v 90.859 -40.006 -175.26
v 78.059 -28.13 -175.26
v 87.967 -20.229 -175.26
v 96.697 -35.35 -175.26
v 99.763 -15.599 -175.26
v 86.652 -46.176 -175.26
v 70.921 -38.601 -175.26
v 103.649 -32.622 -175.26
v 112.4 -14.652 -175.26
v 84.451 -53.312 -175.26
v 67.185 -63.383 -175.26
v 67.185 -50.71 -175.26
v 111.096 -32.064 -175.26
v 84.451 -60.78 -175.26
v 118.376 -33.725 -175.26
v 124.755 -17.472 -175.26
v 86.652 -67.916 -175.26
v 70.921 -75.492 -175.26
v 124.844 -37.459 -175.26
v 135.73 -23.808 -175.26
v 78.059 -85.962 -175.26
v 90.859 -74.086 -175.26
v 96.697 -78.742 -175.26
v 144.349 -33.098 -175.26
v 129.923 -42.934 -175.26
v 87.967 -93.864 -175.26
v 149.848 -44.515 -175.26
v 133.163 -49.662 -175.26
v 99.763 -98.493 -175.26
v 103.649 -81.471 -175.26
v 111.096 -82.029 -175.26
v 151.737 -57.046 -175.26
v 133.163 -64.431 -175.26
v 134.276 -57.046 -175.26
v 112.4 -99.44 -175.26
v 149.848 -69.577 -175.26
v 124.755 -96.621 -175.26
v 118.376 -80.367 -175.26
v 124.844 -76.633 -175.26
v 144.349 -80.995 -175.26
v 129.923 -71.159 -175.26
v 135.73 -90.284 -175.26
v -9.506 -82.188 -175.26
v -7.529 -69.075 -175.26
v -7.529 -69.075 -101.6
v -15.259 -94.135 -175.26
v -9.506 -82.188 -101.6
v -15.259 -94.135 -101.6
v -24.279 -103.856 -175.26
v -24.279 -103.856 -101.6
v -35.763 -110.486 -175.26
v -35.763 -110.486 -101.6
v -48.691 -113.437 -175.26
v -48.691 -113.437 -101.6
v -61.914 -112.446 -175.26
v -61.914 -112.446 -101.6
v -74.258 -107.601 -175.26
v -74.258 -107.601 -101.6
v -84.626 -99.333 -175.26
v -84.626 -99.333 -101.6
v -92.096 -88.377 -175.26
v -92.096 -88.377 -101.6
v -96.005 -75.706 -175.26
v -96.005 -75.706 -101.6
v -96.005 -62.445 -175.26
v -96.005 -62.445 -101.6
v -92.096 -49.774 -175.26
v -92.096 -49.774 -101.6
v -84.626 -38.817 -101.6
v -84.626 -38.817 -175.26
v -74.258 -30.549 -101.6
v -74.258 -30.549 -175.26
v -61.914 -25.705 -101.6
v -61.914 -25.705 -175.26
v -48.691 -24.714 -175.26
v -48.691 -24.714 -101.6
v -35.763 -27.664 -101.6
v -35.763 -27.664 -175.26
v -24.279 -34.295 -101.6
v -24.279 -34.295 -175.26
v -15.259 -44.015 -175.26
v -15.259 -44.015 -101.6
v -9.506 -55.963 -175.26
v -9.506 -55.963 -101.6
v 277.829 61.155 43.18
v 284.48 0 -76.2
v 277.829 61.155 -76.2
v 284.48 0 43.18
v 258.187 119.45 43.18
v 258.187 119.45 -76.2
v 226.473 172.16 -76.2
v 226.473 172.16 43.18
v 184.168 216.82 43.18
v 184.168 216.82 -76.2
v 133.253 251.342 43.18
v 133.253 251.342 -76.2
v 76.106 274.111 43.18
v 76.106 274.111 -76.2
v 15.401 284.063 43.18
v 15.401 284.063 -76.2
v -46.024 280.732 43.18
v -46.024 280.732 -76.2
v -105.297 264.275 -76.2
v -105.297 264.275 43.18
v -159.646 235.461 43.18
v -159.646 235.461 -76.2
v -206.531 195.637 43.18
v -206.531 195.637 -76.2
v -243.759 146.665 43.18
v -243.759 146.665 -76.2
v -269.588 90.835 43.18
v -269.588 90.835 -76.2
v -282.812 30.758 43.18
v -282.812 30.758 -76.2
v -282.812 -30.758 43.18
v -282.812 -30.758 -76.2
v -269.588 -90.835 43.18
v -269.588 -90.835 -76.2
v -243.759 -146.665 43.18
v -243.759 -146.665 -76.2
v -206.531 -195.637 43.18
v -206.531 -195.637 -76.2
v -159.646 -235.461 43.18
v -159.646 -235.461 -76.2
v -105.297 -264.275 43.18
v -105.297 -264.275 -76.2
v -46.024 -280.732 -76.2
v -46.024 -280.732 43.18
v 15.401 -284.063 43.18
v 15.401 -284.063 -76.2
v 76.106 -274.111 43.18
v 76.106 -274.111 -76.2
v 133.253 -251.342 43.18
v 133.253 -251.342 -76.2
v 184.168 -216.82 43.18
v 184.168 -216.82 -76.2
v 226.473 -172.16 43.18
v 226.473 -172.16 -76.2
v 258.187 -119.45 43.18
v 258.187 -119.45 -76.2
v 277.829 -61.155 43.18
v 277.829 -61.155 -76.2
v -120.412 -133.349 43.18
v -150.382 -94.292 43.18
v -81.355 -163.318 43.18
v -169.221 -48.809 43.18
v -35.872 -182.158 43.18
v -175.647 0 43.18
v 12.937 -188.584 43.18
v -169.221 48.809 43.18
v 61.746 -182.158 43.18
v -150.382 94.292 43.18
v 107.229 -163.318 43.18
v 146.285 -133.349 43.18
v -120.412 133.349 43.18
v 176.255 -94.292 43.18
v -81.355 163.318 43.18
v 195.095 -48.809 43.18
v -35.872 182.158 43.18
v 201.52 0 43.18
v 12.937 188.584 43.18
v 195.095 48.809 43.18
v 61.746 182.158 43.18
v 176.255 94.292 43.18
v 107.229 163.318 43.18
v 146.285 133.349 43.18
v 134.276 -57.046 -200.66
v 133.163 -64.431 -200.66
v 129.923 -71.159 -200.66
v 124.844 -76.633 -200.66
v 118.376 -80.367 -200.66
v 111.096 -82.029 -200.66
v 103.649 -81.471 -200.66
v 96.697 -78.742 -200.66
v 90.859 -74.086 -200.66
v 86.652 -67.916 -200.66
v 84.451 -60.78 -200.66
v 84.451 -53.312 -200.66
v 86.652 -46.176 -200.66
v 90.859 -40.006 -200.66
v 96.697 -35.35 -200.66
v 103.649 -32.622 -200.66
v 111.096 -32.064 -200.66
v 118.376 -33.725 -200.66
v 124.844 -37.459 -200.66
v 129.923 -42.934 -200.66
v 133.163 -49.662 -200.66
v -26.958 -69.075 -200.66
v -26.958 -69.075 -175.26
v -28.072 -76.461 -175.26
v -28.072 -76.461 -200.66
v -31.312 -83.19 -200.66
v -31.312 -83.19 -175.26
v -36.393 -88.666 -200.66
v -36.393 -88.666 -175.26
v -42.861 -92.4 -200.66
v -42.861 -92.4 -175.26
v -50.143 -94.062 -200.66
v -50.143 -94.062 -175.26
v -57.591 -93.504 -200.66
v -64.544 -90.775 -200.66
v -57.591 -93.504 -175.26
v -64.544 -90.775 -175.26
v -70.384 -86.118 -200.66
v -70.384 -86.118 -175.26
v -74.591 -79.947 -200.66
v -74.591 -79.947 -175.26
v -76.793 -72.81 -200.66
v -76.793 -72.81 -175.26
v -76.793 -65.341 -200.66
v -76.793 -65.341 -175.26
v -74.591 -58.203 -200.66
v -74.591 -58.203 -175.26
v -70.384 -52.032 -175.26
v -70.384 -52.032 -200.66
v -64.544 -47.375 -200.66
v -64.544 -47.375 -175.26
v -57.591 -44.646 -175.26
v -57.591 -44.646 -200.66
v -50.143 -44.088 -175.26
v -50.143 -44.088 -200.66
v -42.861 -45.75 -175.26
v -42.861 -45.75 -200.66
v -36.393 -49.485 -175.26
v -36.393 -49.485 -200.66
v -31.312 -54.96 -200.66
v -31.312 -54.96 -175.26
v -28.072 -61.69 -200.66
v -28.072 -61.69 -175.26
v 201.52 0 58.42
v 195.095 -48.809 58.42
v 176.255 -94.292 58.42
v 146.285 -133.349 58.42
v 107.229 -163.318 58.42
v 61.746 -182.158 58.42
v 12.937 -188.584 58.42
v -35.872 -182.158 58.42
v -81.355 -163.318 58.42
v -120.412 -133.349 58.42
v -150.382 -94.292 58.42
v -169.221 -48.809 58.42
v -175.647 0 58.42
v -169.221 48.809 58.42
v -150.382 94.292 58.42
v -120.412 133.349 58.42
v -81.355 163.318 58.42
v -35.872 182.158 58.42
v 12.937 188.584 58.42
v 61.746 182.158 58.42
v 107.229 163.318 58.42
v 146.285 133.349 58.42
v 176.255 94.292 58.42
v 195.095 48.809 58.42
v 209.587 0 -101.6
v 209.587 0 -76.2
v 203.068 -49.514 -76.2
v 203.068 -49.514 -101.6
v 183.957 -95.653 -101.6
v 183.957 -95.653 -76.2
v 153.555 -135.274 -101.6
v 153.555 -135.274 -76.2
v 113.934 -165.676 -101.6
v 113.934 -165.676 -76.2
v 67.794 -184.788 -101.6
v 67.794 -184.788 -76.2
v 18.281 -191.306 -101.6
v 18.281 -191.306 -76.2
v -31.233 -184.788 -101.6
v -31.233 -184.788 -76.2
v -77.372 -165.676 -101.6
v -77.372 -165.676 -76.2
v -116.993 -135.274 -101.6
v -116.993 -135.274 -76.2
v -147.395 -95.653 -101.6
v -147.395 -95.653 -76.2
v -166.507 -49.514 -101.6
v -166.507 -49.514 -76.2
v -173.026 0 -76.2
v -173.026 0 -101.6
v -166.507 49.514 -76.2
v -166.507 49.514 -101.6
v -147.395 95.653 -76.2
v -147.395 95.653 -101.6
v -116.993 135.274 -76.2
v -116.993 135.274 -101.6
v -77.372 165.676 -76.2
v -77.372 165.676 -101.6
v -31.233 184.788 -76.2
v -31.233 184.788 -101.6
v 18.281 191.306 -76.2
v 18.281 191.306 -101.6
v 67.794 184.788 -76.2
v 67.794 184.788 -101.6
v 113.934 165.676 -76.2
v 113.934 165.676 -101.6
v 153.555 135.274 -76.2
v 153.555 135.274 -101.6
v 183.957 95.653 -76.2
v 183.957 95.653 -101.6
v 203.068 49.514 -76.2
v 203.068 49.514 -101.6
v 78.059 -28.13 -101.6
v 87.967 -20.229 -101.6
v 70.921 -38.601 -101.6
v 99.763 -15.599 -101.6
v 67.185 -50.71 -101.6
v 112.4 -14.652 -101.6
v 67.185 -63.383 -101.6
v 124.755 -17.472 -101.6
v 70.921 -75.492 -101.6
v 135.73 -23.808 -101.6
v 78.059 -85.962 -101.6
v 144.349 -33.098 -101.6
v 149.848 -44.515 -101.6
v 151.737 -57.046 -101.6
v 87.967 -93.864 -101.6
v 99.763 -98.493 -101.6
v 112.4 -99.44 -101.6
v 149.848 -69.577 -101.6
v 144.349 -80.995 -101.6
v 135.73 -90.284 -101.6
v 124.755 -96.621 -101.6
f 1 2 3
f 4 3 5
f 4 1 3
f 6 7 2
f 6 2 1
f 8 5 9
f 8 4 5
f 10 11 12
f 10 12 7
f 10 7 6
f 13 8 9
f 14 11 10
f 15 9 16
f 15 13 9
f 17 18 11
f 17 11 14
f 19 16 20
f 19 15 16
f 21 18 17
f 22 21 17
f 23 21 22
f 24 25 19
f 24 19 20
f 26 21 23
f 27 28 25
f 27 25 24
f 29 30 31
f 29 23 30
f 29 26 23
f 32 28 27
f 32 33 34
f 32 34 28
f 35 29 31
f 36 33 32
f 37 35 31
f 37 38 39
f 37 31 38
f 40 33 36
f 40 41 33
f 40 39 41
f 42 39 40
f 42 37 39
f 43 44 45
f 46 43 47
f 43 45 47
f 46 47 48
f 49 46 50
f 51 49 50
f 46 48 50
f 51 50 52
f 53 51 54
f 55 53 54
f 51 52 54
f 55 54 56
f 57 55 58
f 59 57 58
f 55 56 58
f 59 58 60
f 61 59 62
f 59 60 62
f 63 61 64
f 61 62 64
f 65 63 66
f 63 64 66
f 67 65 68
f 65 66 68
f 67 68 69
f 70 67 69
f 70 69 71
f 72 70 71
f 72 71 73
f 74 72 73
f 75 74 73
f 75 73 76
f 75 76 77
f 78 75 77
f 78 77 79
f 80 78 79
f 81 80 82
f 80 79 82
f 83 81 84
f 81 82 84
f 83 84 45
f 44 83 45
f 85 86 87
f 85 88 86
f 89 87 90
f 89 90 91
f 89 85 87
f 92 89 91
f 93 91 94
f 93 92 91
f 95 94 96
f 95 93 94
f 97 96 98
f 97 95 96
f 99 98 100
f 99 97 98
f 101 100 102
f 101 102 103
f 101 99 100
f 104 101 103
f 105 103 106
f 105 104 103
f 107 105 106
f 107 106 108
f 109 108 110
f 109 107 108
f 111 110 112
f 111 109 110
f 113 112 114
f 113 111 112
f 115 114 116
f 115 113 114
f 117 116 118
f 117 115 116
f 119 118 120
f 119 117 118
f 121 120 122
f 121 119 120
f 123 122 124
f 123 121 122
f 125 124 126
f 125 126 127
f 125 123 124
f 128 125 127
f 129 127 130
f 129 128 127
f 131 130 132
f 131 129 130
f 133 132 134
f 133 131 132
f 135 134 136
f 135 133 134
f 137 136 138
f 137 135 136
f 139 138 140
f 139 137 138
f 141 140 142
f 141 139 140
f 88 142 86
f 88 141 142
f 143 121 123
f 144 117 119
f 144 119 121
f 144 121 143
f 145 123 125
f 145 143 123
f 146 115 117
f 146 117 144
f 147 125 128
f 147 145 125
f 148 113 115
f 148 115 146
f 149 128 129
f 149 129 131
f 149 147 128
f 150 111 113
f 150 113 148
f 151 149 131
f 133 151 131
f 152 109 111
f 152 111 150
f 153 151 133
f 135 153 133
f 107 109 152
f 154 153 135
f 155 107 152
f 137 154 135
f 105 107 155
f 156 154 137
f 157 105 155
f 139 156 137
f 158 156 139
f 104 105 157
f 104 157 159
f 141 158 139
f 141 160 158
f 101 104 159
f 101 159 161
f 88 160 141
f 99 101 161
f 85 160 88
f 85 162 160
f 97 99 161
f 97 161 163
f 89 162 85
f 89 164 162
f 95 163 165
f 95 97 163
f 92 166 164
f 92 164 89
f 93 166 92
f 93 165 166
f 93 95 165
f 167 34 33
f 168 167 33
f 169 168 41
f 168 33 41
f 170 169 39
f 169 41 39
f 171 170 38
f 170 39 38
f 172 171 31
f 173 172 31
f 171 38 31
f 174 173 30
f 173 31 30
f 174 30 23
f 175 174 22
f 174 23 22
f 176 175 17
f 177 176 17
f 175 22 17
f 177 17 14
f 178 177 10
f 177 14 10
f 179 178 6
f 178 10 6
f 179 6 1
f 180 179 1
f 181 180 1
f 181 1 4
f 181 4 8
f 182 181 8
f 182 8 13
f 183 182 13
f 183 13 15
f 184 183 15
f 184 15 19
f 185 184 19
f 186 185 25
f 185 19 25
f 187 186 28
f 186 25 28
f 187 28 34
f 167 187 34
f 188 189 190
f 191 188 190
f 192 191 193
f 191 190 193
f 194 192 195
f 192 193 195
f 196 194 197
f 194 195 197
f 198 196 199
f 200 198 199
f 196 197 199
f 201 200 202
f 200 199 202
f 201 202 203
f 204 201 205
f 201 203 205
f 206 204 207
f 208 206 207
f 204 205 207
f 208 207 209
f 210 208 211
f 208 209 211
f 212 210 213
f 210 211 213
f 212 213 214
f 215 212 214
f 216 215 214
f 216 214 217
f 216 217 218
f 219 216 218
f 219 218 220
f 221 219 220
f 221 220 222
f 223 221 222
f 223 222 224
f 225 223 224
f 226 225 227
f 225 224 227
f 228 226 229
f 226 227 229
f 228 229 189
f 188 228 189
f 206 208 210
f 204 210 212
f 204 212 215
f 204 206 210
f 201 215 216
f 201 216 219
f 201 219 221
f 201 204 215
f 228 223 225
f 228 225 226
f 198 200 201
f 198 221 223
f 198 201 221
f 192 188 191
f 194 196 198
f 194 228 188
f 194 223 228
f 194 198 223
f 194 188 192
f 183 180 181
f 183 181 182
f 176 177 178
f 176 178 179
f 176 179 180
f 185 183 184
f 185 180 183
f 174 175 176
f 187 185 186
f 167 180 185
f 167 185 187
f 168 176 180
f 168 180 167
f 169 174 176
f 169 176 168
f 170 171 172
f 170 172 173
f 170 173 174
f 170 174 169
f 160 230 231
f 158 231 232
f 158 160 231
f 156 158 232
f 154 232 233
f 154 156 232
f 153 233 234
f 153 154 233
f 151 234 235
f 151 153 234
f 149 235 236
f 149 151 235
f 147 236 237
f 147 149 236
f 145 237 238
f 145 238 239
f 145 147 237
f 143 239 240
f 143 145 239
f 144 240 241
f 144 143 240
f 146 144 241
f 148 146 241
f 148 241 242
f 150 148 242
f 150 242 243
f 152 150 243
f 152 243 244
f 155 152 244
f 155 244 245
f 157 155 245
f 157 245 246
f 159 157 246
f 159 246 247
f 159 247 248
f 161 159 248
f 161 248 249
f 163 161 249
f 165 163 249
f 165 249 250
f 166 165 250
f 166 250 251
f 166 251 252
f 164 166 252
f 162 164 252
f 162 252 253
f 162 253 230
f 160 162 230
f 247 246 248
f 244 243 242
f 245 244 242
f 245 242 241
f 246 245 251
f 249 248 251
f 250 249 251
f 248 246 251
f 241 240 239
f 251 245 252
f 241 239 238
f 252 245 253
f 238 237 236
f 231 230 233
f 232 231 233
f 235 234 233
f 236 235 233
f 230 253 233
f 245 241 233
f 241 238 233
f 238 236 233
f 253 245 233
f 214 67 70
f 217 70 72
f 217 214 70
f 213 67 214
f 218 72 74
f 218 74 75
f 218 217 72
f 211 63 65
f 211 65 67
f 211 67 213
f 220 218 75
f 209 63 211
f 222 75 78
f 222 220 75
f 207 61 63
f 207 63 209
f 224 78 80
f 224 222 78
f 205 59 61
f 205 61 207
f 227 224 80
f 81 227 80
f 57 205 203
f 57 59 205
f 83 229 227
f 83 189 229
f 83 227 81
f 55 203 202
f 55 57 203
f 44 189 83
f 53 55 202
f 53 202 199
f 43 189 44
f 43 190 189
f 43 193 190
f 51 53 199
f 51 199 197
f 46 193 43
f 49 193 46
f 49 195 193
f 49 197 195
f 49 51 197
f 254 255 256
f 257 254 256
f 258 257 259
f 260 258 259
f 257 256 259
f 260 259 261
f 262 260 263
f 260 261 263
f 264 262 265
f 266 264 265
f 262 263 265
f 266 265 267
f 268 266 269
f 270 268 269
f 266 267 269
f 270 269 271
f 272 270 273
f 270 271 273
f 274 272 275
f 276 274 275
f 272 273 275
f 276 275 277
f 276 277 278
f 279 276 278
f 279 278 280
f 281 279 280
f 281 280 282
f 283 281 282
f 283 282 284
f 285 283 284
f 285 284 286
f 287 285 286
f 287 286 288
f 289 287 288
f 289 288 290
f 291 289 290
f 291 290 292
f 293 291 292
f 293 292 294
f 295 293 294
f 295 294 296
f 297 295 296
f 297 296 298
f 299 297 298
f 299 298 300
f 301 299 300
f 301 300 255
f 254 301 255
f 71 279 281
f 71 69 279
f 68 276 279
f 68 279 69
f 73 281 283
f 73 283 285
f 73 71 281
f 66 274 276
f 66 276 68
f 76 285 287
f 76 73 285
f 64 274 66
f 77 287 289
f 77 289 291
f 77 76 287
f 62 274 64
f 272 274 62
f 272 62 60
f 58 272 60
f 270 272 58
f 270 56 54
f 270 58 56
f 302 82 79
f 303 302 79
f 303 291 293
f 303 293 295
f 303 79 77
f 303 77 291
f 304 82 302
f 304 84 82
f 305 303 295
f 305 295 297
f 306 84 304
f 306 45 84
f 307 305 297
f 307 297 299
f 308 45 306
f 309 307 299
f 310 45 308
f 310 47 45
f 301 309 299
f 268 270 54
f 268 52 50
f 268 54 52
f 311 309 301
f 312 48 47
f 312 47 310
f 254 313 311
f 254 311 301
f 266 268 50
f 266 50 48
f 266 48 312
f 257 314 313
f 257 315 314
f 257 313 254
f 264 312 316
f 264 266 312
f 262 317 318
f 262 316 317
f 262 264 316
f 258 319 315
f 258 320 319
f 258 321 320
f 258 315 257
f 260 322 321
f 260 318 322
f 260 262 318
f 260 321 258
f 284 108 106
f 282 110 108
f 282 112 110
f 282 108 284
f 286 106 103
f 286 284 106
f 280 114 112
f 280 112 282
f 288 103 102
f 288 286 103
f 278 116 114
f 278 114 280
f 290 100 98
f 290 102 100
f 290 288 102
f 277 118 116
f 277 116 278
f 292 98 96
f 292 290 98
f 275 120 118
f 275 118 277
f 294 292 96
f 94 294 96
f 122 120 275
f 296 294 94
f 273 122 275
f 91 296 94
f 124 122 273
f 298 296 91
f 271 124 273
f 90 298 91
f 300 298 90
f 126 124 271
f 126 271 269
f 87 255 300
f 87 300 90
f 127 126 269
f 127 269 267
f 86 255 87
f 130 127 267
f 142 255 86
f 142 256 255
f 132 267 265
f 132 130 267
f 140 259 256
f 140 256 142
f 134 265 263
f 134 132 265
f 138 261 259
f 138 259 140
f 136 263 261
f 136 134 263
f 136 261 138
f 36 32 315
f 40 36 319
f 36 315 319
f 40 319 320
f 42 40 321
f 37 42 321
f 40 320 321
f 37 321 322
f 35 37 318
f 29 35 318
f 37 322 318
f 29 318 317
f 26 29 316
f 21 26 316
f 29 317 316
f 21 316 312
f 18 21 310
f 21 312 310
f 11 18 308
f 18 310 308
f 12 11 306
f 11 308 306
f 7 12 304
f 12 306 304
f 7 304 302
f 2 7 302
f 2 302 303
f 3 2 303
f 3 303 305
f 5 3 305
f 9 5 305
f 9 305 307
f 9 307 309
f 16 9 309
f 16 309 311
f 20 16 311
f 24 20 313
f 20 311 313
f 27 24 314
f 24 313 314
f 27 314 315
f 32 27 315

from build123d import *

# Parameters (mm, degrees)
F0_R      = 284.48
F0_R_2    = 107.1929715192
F0_R_3    = 113.5568544934
F1_DEPTH  = 43.18
F2_DEPTH  = 25.4
F3_R      = 188.583728209
F4_DEPTH  = 83.82
F5_R      = 191.3062955449
F6_DEPTH  = 25.4
F7_DEPTH  = 50.8
F8_R      = 44.4860383671
F8_R_2    = 42.5130720405
F9_DEPTH  = 73.66
F11_R     = 25.0558665745
F12_DEPTH = 96.52
F13_R     = 24.5435955791
F15_DEPTH = 60.96
F16_R     = 25.0526065755
F17_DEPTH = 25.4
F18_R     = 25.0571
F18_R_2   = 24.5435955791
F19_DEPTH = 25.4


# Not quite as in the source:
# - the program builds the solid bodies; features that only make, move or delete a surface that nothing else refers to are left out


with BuildPart() as f1:
    # F0 (on Top) → F1 (new body)
    with BuildSketch(Plane.XY):
        Circle(F0_R)
        with Locations((-137.995660305, 0)):
            Circle(F0_R_2, mode=Mode.SUBTRACT)
        with Locations((127.078294754, 0)):
            Circle(F0_R_3, mode=Mode.SUBTRACT)
        with BuildLine():
            ThreePointArc((-102.7708947659, 136.166498065), (-10.3978756011, 204.9943768322), (94.8023349047, 158.0585986376))
            ThreePointArc((94.8023349047, 158.0585986376), (-4.0832297138, 148.0055566847), (-102.7708947659, 136.166498065))
        make_face(mode=Mode.SUBTRACT)
        with Locations((-137.995660305, 0)):
            Circle(F0_R_2)
        with Locations((127.078294754, 0)):
            Circle(F0_R_3)
        with BuildLine():
            ThreePointArc((-102.7708947659, 136.166498065), (-4.0832297138, 148.0055566847), (94.8023349047, 158.0585986376))
            ThreePointArc((94.8023349047, 158.0585986376), (-10.3978756011, 204.9943768322), (-102.7708947659, 136.166498065))
        make_face()
    extrude(amount=F1_DEPTH)

    # F2 (add): a face of the model
    f2_faces = [f1.faces().sort_by_distance(p)[0] for p in [
        (0, 0, 0),
    ]]
    extrude(f2_faces, amount=F2_DEPTH)

    # F3 (on face) → F4 (join)
    with BuildSketch(Plane(origin=(0, 0, -25.4), x_dir=(1, 0, 0), z_dir=(0, 0, -1))):
        with Locations((12.9366638139, 0)):
            Circle(F3_R)
    extrude(amount=-F4_DEPTH)

    # F5 (on face) → F6 (join)
    with BuildSketch(Plane(origin=(0, 0, -25.4), x_dir=(1, 0, 0), z_dir=(0, 0, -1))):
        with Locations((18.2807631791, 0)):
            Circle(F5_R)
    extrude(amount=F6_DEPTH)

    # F7 (add): faces of the model
    f7_faces = [f1.faces().sort_by_distance(p)[0] for p in [
        (-276.4336905155, 0, -25.4),
        (-173.3657778507, 0, -25.4),
        (18.2807631791, 0, -50.8),
    ]]
    extrude(f7_faces, amount=F7_DEPTH)

    # F8 (on face) → F9 (join)
    with BuildSketch(Plane(origin=(0, 0, -101.6), x_dir=(1, 0, 0), z_dir=(0, 0, -1))):
        with Locations((-52.0154200494, 69.075293839)):
            Circle(F8_R)
        with Locations((109.2234924436, 57.04626441)):
            Circle(F8_R_2)
    extrude(amount=F9_DEPTH)

    # F11 (on face) → F12 (join)
    with BuildSketch(Plane(origin=(0, 0, -175.26), x_dir=(1, 0, 0), z_dir=(0, 0, -1))):
        with Locations((-52.0154200494, 69.075293839)):
            Circle(F11_R)
    extrude(amount=-F12_DEPTH)

    # F13 (on face) → F15 (join)
    with BuildSketch(Plane(origin=(0, 0, -175.26), x_dir=(1, 0, 0), z_dir=(0, 0, -1))):
        with Locations((-52.0154200494, 69.075293839)):
            Circle(F13_R)
    extrude(amount=-F15_DEPTH)

    # F16 (on face) → F17 (join)
    with BuildSketch(Plane(origin=(0, 0, -175.26), x_dir=(1, 0, 0), z_dir=(0, 0, -1))):
        with Locations((109.2234924436, 57.04626441)):
            Circle(F16_R)
    extrude(amount=F17_DEPTH)

    # F18 (on face) → F19 (join)
    with BuildSketch(Plane(origin=(0, 0, -175.26), x_dir=(1, 0, 0), z_dir=(0, 0, -1))):
        with Locations((-52.0154200494, 69.075293839)):
            Circle(F18_R)
        with Locations((-52.0154200494, 69.075293839)):
            Circle(F18_R_2, mode=Mode.SUBTRACT)
        with Locations((-52.0154200494, 69.075293839)):
            Circle(F18_R_2)
    extrude(amount=F19_DEPTH)


solid = f1.part
